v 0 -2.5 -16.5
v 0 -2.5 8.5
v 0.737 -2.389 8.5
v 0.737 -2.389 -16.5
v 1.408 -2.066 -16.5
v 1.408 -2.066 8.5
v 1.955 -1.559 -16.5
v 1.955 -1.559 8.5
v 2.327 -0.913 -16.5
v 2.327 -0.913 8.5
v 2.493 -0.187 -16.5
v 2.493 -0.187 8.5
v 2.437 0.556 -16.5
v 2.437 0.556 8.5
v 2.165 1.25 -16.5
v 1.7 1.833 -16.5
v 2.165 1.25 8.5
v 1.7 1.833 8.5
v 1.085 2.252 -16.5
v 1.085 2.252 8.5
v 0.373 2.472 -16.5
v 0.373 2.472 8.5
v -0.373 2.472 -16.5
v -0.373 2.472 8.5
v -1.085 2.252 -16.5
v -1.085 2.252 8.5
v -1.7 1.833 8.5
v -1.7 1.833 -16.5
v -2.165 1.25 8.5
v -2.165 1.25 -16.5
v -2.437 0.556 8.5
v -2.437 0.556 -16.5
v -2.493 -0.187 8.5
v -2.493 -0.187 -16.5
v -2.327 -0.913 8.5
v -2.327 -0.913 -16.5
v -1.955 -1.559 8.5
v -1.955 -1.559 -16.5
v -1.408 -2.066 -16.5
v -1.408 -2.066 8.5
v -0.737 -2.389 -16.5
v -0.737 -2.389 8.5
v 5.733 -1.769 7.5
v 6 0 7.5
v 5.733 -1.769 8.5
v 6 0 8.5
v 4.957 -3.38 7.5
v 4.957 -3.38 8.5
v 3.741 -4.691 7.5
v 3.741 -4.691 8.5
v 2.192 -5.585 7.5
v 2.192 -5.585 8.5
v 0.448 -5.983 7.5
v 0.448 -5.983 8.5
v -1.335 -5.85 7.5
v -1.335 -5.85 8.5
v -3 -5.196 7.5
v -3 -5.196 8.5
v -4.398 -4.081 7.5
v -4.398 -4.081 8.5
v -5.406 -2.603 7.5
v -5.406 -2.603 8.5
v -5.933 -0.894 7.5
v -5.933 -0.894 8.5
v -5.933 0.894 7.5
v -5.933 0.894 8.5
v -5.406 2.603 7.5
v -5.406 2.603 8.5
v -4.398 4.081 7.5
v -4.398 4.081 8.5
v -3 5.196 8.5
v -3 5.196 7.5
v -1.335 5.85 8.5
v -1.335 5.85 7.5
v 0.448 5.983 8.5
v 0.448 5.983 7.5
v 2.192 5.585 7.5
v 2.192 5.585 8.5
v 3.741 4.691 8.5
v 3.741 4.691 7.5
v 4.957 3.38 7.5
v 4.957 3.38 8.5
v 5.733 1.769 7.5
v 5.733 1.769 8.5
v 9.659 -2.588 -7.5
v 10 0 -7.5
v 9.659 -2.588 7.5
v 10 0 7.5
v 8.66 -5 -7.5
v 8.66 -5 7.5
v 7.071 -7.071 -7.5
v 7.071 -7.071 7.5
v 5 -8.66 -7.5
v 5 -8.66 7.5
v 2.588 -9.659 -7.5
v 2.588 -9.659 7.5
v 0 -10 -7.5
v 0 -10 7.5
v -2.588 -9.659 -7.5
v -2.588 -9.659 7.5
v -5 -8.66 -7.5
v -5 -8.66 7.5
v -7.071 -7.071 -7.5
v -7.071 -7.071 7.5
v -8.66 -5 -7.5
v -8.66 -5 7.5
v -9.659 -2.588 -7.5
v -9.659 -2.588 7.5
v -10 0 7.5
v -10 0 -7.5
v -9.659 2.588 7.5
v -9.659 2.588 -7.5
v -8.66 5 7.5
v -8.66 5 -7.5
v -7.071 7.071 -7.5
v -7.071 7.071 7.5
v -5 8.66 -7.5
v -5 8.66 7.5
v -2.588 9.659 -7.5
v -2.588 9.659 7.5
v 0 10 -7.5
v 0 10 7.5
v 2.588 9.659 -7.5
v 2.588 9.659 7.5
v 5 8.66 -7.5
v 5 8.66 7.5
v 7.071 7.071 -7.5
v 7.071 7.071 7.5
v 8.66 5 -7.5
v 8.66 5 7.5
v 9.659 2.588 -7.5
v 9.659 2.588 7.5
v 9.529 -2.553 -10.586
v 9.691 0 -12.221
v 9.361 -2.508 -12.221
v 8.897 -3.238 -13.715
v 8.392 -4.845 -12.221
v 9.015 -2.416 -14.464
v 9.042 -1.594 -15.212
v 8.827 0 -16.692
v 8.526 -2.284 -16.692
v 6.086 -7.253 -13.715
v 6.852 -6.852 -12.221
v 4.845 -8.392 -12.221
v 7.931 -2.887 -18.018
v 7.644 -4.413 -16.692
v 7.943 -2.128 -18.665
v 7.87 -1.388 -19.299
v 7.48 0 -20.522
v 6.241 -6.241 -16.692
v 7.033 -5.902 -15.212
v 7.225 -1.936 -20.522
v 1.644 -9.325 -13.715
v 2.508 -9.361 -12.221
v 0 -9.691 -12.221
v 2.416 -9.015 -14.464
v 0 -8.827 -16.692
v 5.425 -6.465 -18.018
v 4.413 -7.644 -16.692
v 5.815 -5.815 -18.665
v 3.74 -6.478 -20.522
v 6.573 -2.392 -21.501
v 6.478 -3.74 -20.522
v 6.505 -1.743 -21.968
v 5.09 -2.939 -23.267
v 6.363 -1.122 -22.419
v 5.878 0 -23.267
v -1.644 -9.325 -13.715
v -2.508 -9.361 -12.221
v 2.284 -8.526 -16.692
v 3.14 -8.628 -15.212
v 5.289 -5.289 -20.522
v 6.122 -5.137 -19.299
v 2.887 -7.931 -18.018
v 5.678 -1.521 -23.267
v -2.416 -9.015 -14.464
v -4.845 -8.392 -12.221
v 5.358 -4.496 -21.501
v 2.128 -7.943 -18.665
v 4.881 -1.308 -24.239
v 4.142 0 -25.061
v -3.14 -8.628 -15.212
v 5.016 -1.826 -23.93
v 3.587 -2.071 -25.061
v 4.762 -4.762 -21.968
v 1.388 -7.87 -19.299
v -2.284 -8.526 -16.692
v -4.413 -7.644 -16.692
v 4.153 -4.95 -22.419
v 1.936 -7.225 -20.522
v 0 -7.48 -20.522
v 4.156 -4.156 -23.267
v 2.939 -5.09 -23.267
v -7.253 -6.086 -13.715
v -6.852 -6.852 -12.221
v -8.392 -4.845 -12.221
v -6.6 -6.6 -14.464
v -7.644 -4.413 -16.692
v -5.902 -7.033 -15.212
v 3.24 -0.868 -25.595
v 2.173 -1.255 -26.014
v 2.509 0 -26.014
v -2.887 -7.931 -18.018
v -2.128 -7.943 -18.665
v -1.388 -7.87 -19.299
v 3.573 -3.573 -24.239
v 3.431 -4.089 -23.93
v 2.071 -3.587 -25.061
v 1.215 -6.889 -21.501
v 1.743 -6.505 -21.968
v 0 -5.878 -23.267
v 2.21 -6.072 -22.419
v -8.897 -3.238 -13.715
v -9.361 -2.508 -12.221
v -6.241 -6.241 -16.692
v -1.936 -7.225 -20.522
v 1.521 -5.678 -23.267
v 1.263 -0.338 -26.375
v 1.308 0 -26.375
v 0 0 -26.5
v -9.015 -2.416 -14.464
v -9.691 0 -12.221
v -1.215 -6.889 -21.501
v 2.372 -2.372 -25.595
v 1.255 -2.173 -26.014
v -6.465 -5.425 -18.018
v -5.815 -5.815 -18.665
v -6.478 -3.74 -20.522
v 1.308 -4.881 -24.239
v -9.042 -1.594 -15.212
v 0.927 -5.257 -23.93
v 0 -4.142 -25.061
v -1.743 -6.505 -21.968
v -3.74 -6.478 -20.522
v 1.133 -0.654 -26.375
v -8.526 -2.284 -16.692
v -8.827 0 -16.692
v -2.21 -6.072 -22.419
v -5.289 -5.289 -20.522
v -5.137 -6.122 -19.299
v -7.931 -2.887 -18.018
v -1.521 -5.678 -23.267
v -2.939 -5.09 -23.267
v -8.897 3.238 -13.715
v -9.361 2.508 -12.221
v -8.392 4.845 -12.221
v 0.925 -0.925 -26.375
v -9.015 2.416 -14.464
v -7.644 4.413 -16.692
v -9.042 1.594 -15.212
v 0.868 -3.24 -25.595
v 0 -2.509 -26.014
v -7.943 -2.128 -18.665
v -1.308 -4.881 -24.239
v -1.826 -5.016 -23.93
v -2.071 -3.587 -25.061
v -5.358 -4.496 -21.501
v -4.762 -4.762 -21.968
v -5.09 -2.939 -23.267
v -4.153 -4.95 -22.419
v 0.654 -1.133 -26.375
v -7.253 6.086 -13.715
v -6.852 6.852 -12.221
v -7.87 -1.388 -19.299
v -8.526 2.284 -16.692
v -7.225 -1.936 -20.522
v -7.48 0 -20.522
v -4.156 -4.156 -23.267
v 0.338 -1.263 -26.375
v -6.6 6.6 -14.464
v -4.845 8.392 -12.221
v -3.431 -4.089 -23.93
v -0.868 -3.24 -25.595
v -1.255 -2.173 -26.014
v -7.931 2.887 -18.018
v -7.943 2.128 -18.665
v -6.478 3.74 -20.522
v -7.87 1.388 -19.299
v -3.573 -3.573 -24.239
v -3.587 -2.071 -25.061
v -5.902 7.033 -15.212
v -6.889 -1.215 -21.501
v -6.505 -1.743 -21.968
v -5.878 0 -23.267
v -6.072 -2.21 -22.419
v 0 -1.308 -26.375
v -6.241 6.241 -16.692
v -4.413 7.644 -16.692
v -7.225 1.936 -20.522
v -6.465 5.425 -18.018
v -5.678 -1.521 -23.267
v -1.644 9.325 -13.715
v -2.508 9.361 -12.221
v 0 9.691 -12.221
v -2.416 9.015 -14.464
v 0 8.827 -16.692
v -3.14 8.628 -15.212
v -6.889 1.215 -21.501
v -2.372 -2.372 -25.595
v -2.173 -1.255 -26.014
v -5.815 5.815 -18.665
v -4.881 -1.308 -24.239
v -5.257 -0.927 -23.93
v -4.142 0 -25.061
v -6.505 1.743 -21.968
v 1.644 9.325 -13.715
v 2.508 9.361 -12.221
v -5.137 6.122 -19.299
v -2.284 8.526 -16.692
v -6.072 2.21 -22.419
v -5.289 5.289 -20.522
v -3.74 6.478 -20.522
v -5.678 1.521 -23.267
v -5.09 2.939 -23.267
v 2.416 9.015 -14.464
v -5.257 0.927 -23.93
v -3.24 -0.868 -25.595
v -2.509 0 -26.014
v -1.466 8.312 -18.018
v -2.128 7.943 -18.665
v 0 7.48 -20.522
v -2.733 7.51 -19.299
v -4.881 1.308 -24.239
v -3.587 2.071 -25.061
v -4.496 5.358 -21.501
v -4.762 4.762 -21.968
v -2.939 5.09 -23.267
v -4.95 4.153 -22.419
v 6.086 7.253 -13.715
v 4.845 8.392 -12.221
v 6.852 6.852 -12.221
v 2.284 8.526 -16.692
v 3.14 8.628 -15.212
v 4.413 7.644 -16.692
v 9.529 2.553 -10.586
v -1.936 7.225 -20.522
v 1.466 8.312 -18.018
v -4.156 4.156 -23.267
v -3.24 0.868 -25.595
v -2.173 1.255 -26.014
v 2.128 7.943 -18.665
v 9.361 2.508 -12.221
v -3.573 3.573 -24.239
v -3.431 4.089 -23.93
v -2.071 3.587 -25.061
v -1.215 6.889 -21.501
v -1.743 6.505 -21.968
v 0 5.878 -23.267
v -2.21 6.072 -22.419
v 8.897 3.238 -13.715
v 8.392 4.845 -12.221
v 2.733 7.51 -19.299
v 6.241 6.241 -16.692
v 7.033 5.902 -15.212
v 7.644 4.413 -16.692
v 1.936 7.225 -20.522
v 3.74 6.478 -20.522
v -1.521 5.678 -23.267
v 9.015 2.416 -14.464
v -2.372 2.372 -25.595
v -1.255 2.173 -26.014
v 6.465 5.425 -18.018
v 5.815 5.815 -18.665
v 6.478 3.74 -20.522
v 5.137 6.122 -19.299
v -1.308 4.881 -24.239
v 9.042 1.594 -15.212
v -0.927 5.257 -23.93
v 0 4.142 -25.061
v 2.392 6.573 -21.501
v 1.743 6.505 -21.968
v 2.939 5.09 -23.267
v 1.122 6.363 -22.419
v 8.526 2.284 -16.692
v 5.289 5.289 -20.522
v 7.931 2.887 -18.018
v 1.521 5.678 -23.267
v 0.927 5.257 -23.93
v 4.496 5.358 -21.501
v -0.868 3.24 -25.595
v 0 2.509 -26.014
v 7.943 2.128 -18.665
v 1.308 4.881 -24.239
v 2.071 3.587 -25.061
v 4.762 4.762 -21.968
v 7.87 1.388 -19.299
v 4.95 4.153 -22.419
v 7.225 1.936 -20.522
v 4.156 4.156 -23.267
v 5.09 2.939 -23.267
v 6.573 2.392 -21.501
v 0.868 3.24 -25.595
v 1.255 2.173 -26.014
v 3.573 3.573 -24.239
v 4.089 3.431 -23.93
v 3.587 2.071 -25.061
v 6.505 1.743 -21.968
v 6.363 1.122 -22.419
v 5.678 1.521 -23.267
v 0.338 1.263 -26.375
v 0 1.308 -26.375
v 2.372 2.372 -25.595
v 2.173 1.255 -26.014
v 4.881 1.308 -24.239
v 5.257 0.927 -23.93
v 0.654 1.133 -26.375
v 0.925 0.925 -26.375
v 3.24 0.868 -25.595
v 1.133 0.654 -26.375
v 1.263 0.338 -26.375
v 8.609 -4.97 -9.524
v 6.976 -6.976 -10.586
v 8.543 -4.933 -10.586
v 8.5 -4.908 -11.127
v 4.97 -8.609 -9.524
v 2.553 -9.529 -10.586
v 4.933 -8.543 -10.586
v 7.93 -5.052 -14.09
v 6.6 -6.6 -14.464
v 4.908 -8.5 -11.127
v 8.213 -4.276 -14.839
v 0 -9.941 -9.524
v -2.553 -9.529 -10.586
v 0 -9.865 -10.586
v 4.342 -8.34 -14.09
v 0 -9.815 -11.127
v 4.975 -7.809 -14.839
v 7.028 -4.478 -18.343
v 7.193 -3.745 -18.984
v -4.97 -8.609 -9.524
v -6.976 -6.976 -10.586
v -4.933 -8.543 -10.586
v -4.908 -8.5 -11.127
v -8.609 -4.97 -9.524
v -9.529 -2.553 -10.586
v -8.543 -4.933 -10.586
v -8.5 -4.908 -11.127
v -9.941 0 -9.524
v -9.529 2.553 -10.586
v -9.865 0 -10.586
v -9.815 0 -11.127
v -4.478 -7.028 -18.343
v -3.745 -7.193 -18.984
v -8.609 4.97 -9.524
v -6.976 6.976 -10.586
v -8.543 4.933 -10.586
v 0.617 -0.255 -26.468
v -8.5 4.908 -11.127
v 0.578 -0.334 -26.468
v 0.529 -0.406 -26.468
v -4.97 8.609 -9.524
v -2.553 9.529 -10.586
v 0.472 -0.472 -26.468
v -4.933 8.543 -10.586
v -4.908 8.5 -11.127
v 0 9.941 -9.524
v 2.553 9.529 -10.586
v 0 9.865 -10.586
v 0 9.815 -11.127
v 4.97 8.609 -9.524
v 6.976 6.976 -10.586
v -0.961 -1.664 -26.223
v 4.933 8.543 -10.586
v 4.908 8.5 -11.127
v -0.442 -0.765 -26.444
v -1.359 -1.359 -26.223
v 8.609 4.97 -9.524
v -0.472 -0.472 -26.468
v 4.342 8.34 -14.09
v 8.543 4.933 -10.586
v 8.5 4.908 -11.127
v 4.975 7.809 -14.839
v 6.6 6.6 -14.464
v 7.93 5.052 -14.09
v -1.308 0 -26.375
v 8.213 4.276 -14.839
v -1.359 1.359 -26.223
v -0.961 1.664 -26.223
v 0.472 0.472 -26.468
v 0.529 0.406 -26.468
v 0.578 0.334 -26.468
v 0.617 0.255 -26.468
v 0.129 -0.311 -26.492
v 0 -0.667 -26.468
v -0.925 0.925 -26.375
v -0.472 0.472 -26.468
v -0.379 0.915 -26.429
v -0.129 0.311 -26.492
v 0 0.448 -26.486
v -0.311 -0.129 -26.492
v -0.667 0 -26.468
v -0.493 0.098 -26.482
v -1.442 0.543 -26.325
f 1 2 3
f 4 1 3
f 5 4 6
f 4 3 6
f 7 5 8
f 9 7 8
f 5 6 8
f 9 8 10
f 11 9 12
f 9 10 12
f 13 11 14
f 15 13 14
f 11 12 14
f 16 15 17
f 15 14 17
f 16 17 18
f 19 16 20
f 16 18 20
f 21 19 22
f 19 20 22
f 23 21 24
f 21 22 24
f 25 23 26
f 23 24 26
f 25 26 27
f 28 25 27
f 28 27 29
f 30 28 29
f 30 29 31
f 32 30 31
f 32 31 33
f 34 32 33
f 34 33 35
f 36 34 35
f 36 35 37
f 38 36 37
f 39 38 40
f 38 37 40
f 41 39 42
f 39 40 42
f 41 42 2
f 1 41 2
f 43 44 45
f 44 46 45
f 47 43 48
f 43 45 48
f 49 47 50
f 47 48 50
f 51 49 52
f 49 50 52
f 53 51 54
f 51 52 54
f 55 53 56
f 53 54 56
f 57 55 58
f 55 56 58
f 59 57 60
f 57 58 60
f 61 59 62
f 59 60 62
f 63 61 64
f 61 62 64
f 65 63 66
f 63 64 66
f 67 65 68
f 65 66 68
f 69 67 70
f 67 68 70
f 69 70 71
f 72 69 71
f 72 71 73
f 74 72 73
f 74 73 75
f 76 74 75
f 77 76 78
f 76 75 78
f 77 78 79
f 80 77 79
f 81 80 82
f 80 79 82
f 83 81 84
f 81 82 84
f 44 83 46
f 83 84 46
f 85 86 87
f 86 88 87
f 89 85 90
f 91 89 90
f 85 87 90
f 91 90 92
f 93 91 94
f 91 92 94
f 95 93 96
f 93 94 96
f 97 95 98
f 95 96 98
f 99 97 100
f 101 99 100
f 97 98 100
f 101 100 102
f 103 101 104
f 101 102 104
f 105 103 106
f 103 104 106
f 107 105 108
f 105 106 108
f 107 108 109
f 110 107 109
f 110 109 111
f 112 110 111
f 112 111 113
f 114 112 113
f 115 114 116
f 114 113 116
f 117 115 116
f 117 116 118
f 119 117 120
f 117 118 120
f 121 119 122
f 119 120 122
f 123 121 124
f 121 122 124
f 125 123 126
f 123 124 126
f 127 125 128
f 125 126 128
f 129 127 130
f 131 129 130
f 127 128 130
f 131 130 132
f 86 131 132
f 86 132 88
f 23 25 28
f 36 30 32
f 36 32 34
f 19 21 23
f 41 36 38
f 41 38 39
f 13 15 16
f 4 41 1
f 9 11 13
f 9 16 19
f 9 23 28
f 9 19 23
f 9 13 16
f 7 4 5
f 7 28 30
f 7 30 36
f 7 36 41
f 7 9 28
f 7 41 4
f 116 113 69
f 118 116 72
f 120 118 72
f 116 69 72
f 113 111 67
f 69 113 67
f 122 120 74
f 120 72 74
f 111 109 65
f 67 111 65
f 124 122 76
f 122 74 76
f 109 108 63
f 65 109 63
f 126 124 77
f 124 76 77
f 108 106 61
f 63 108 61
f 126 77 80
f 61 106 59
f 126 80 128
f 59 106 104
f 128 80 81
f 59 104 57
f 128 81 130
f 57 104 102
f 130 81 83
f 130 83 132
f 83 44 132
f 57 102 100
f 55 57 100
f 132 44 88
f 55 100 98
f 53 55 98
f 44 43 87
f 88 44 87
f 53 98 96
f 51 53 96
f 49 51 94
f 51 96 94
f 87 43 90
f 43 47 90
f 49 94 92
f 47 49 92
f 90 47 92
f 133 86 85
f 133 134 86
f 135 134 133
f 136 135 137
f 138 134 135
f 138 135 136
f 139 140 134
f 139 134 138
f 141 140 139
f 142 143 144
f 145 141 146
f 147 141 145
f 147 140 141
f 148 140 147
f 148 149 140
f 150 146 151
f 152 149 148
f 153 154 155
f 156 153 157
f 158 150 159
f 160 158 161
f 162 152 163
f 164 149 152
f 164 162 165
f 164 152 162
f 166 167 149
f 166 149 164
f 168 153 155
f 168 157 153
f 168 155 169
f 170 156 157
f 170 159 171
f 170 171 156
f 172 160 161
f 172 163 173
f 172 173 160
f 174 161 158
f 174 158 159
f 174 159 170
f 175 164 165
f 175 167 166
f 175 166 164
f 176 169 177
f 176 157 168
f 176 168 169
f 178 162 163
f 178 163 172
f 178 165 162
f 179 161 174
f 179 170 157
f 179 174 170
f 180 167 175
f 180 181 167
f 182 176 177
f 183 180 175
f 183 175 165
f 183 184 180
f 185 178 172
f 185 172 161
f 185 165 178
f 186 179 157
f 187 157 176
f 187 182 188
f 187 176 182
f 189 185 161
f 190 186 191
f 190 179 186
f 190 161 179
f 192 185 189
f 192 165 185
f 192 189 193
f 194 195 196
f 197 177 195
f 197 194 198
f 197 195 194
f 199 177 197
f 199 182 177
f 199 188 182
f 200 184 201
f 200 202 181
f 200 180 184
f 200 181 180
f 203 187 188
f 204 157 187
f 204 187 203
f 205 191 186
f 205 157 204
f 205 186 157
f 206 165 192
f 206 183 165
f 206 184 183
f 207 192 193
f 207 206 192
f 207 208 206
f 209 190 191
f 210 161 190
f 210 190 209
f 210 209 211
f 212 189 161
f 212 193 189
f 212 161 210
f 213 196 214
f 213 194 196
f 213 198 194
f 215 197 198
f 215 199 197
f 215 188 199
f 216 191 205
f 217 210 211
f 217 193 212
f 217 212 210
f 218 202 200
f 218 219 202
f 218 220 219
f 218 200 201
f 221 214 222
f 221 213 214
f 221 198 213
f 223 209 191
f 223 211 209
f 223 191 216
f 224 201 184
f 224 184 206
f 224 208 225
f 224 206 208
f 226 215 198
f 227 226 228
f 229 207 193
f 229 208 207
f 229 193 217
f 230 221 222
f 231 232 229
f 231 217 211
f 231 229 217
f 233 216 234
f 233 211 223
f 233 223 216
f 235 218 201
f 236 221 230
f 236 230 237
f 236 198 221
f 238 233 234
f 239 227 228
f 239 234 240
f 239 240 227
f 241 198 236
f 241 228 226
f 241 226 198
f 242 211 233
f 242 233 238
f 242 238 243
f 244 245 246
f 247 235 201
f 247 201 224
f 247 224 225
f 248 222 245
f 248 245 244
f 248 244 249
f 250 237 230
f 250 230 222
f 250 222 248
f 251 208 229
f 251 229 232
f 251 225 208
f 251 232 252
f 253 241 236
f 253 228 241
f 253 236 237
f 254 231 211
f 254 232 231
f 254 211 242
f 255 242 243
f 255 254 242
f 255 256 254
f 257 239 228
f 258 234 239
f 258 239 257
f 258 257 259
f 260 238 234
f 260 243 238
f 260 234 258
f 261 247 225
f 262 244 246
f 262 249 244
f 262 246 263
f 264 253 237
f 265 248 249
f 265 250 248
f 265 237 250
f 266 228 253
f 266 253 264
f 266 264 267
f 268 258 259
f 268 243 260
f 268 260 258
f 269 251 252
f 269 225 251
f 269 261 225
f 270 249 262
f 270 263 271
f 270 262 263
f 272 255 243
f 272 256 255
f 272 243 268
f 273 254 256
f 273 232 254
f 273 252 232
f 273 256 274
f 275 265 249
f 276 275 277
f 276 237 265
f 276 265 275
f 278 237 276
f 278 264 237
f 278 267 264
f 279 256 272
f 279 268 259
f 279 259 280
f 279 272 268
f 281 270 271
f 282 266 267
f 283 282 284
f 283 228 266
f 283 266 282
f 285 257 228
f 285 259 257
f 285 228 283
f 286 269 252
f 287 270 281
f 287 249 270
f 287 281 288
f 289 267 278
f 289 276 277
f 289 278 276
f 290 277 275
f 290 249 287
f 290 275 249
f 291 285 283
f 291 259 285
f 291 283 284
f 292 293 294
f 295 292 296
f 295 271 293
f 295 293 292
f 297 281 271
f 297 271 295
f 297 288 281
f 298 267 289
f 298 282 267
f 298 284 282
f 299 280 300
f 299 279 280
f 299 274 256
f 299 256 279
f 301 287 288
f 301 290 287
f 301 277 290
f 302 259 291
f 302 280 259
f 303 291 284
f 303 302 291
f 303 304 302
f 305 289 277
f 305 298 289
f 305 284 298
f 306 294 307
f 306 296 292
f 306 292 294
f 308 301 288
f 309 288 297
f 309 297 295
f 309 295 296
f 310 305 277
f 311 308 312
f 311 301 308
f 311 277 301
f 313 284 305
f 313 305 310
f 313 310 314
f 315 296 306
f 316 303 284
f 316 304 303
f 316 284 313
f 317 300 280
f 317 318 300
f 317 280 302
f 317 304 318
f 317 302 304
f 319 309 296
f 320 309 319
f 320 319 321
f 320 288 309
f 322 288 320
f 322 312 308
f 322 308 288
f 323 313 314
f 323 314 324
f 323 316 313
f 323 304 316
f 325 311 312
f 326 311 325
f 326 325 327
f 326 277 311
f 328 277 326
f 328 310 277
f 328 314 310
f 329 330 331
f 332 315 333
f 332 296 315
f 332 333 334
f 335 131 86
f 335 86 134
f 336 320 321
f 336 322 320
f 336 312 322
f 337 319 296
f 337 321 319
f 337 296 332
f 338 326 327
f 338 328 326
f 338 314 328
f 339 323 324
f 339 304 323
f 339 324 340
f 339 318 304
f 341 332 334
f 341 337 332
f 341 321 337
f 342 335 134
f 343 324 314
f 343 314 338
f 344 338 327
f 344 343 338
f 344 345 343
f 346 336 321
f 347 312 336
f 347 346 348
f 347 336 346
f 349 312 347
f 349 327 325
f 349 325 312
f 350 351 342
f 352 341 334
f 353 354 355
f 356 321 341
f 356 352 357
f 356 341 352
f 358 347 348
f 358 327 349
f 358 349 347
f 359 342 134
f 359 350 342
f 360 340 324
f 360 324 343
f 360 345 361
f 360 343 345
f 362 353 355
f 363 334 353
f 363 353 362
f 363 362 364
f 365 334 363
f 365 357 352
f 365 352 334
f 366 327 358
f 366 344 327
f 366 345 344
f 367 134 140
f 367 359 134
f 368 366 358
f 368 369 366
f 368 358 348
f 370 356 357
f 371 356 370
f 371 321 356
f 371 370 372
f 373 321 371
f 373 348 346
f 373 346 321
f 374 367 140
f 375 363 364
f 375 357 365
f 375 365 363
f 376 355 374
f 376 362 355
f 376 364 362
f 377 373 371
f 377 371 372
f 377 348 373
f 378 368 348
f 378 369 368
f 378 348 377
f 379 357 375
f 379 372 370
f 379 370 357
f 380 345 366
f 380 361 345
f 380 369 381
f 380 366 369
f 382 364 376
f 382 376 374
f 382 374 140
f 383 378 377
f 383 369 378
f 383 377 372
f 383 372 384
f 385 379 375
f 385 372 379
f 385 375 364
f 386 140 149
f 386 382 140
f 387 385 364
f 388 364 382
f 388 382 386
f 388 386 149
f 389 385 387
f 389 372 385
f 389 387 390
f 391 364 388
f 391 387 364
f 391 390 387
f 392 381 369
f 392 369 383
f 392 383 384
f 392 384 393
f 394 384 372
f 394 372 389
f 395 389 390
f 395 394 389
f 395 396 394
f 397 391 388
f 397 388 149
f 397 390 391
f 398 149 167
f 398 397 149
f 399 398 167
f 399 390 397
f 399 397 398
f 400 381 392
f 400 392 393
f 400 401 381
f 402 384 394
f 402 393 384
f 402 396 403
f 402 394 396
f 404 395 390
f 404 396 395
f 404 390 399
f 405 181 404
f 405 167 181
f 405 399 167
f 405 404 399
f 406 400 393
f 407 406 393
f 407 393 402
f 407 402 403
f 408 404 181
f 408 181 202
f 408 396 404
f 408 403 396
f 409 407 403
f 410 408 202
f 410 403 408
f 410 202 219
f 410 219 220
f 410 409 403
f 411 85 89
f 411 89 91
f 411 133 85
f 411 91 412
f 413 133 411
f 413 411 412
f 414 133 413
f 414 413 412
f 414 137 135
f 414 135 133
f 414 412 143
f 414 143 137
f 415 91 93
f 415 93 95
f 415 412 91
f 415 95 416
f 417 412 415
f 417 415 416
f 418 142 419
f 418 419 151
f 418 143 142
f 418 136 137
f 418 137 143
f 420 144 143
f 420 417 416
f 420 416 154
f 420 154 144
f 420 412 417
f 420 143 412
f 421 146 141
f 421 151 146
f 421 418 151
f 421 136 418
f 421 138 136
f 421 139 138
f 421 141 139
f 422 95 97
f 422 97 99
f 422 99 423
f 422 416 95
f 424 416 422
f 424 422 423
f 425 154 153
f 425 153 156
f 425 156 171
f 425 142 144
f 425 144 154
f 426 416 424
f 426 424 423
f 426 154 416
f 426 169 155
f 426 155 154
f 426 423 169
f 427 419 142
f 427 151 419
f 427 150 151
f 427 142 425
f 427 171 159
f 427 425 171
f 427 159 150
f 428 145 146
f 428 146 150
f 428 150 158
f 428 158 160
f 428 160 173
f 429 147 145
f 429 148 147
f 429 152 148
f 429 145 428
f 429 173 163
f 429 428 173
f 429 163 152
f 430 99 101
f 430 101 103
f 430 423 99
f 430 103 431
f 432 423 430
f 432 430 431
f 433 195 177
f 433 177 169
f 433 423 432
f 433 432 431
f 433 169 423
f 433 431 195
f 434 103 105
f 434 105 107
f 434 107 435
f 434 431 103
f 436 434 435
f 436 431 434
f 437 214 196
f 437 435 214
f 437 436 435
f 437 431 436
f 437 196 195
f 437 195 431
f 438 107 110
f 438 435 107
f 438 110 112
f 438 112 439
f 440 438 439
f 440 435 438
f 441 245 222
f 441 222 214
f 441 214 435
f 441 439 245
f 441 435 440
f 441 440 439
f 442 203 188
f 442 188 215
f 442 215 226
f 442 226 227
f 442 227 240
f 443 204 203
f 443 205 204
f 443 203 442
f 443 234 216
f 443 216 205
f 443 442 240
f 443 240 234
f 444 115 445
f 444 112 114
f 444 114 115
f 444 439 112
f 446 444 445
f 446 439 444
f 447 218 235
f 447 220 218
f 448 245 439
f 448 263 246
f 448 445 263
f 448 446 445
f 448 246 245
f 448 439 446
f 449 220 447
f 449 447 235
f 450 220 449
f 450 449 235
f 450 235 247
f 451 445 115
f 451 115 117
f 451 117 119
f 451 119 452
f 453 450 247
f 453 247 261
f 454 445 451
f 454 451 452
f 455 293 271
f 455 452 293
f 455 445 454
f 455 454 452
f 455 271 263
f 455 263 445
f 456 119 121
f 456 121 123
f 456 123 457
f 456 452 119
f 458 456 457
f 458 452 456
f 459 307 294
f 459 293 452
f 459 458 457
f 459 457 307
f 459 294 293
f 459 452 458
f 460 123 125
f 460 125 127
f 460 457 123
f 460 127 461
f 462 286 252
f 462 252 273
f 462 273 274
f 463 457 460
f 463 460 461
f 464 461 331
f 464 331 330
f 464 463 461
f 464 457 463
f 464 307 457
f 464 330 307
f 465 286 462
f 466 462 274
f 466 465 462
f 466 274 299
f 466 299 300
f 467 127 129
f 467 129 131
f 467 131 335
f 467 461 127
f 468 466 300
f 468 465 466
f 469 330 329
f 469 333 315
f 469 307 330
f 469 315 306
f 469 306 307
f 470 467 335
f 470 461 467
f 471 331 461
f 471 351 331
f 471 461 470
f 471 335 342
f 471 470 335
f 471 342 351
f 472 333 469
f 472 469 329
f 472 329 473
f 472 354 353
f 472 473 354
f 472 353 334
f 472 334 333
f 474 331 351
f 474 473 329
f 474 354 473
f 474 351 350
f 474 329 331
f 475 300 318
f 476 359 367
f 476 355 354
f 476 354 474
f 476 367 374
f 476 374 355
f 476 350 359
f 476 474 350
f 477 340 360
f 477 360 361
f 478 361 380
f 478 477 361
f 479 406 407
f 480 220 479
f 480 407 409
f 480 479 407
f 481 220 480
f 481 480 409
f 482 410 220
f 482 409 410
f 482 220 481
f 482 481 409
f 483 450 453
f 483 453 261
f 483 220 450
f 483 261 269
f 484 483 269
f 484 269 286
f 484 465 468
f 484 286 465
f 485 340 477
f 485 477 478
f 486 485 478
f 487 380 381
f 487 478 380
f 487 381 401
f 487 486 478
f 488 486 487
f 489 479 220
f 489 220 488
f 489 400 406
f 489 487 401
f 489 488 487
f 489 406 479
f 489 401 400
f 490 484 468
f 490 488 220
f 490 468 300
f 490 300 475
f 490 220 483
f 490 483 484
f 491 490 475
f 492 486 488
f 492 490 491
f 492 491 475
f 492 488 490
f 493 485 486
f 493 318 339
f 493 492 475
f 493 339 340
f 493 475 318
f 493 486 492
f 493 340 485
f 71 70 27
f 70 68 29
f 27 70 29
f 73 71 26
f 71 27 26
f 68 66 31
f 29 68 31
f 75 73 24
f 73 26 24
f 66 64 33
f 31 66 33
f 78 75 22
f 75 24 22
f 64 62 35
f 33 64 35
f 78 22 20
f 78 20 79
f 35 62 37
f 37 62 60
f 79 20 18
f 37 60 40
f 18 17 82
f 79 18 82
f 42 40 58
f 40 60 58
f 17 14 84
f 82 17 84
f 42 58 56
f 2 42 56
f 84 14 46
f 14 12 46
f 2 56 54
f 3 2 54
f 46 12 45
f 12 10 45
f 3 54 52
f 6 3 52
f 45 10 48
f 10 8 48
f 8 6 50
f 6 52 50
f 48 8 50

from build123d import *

# Parameters (mm, degrees)
F2_R     = 2.5
F3_DEPTH = 25
F5_ANGLE = 90


with BuildPart() as f1:
    # F0 (on Front) → F1 (revolve)
    with BuildSketch(Plane.XZ):
        with BuildLine():
            Line((-8.5, 0), (0, 0))
            Line((0, 0), (26.5, 0))
            add(Edge.make_bspline(
                [(7.5, 10), (14.95356, 10), (26.5, 7.45356), (26.5, 0)],
                knots=[0, 0, 0, 0, 21.470911, 21.470911, 21.470911, 21.470911], degree=3))
            Line((7.5, 10), (-7.5, 10))
            Line((-7.5, 10), (-7.5, 6))
            Line((-7.5, 6), (-8.5, 6))
            Line((-8.5, 6), (-8.5, 0))
        make_face()
    revolve(axis=Axis((13.25, 0, 0), (1, 0, 0)))

    # F2 (on face) → F3 (cut)
    with BuildSketch(Plane(origin=(-8.5, 0, 0), x_dir=(0, -1, 0), z_dir=(-1, 0, 0))):
        Circle(F2_R)
    extrude(amount=-F3_DEPTH, mode=Mode.SUBTRACT)


with BuildPart() as f1_1:
    # F5: moved
    add(f1.part.rotate(Axis((0, 12.53504, 0), (0, 1, 0)), F5_ANGLE))


solid = f1_1.part
